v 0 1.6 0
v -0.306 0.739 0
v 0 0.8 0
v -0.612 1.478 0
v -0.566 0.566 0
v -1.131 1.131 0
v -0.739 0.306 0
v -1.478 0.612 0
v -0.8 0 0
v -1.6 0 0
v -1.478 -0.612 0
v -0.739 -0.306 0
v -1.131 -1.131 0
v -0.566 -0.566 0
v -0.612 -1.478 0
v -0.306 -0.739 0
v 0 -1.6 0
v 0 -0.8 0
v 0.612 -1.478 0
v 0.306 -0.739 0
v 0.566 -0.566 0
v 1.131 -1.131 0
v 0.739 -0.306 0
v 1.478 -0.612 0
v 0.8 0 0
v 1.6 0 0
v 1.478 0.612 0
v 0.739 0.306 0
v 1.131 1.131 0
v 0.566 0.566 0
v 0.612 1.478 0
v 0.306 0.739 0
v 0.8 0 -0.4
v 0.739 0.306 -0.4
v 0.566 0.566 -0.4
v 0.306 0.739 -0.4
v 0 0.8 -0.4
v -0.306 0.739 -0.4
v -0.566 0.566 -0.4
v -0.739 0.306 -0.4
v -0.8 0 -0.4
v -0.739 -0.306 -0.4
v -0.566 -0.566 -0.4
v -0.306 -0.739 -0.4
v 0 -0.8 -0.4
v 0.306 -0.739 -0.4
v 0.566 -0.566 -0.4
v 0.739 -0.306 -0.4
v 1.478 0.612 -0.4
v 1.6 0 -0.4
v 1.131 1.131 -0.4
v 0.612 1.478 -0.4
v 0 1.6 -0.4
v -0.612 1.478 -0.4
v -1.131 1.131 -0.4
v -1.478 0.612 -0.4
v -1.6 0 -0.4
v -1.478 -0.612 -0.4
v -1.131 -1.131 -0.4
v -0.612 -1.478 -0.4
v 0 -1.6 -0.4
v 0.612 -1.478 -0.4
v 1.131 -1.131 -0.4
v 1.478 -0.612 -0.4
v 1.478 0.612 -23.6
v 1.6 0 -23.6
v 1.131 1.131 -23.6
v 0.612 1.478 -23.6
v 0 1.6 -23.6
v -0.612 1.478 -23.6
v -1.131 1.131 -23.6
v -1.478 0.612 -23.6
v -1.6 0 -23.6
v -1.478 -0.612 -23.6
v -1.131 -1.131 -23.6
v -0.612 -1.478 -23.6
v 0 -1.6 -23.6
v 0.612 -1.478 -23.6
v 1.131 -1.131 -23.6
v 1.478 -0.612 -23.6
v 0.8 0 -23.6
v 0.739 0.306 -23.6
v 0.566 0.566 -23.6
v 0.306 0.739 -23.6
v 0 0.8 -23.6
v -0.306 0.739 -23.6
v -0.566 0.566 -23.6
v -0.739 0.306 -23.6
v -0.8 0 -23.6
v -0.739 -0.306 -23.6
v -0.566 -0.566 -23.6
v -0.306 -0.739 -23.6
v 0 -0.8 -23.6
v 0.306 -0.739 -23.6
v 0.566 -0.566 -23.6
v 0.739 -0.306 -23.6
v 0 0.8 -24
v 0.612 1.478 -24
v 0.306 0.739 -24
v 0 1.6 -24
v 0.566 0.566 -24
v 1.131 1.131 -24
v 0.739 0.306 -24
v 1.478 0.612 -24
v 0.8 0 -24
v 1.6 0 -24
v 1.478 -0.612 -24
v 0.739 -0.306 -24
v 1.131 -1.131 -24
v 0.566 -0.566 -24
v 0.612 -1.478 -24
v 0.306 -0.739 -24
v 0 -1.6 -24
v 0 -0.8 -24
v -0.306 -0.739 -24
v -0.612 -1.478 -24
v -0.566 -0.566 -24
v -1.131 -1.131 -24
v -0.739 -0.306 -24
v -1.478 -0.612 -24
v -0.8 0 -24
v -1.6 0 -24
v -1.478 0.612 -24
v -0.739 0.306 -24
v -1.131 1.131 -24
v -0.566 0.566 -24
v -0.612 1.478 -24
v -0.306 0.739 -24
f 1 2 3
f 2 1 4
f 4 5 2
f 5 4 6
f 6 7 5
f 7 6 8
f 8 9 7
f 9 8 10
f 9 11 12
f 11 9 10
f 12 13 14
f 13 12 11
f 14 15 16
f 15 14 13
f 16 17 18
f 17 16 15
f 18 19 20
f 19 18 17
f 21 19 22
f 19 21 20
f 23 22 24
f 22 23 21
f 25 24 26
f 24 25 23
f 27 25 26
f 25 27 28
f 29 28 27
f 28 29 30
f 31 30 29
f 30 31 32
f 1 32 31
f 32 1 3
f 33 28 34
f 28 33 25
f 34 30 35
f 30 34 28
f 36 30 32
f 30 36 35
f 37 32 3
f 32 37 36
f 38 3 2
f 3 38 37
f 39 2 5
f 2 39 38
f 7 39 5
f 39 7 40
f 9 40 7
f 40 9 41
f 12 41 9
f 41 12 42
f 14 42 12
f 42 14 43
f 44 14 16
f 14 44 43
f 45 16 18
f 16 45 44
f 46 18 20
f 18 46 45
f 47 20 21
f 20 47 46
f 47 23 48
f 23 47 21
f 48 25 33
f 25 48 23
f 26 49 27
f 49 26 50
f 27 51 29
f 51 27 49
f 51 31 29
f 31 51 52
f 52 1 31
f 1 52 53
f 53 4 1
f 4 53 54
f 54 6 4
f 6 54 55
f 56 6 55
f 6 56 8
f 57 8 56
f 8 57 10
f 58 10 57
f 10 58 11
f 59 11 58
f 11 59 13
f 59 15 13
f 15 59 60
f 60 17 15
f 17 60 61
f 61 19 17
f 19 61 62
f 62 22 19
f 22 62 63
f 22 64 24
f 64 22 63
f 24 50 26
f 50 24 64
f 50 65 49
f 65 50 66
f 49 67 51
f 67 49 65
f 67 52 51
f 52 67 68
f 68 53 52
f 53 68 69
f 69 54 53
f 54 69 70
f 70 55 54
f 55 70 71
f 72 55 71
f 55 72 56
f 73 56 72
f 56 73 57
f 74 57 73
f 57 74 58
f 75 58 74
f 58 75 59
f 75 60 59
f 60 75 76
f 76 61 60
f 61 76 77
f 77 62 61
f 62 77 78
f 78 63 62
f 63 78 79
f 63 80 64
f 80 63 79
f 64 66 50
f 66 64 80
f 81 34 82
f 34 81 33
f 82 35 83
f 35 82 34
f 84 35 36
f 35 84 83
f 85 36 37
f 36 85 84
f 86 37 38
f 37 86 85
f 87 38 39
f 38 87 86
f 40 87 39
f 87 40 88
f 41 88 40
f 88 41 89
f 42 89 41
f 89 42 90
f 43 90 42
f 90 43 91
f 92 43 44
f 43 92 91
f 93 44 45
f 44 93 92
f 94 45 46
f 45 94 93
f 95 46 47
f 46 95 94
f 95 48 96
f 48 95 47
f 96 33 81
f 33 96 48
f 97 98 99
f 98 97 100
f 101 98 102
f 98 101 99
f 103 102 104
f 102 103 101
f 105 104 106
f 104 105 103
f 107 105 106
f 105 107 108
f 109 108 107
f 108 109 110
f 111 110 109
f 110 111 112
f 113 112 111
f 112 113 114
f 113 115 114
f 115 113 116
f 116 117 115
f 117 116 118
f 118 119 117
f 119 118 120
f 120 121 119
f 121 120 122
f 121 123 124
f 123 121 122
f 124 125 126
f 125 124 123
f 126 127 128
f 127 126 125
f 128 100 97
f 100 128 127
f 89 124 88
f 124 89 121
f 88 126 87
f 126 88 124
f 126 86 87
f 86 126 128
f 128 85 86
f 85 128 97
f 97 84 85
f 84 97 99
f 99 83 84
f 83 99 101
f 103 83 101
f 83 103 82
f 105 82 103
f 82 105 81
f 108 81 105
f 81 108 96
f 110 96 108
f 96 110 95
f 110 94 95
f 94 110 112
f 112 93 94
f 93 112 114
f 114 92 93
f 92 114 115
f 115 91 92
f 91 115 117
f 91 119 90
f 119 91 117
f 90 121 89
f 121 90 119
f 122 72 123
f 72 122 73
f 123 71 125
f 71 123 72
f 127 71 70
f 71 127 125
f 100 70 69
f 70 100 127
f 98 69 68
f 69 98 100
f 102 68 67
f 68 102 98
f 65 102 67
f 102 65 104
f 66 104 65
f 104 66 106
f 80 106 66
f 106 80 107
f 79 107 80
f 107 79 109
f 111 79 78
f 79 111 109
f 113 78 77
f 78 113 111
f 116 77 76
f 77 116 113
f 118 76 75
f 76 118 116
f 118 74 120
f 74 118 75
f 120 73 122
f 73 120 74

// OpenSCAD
// file: ../p/4-4ring1.scad
use <../lib.scad>
function ldraw_lib__4_4ring1() = [
// 0 Ring  1 x 1.0
// 0 Name: 4-4ring1.dat
// 0 Author: James Jessiman
// 0 !LDRAW_ORG Primitive UPDATE 2009-01
// 0 !LICENSE Licensed under CC BY 2.0 and CC BY 4.0 : see CAreadme.txt
// 
// 0 BFC CERTIFY CCW
  [0,"BFC","CERTIFY"],
  [0,"BFC","CCW"],
// 
// 0 !HISTORY 1998-12-15 [PTadmin] Official Update 1998-10
// 0 !HISTORY 2002-04-08 [BrickCaster] Modified for BFC compliance
// 0 !HISTORY 2002-04-25 [PTadmin] Official Update 2002-02
// 0 !HISTORY 2007-06-24 [PTadmin] Header formatted for Contributor Agreement
// 0 !HISTORY 2008-07-01 [PTadmin] Official Update 2008-01
// 0 !HISTORY 2008-08-26 [cwdee] Switch polygon winding and rename
// 0 !HISTORY 2009-05-02 [PTadmin] Official Update 2009-01
// 
// 
// 4 16 -0.7654 0 1.8478 -0.3827 0 0.9239 0 0 1 0 0 2
  [4,16,-0.7654,0,1.8478,-0.3827,0,0.9239,0,0,1,0,0,2],
// 4 16 -1.4142 0 1.4142 -0.7071 0 0.7071 -0.3827 0 0.9239 -0.7654 0 1.8478
  [4,16,-1.4142,0,1.4142,-0.7071,0,0.7071,-0.3827,0,0.9239,-0.7654,0,1.8478],
// 4 16 -1.8478 0 0.7654 -0.9239 0 0.3827 -0.7071 0 0.7071 -1.4142 0 1.41420
  [4,16,-1.8478,0,0.7654,-0.9239,0,0.3827,-0.7071,0,0.7071,-1.4142,0,1.41420],
// 4 16 -2 0 0 -1 0 0 -0.9239 0 0.3827 -1.8478 0 0.7654
  [4,16,-2,0,0,-1,0,0,-0.9239,0,0.3827,-1.8478,0,0.7654],
// 4 16 -1.8478 0 -0.7654 -0.9239 0 -0.3827 -1 0 0 -2 0 0
  [4,16,-1.8478,0,-0.7654,-0.9239,0,-0.3827,-1,0,0,-2,0,0],
// 4 16 -1.4142 0 -1.4142 -0.7071 0 -0.7071 -0.9239 0 -0.3827 -1.8478 0 -0.7654
  [4,16,-1.4142,0,-1.4142,-0.7071,0,-0.7071,-0.9239,0,-0.3827,-1.8478,0,-0.7654],
// 4 16 -0.7654 0 -1.8478 -0.3827 0 -0.9239 -0.7071 0 -0.7071 -1.4142 0 -1.4142
  [4,16,-0.7654,0,-1.8478,-0.3827,0,-0.9239,-0.7071,0,-0.7071,-1.4142,0,-1.4142],
// 4 16 0 0 -2 0 0 -1 -0.3827 0 -0.9239 -0.7654 0 -1.8478
  [4,16,0,0,-2,0,0,-1,-0.3827,0,-0.9239,-0.7654,0,-1.8478],
// 4 16 0.7654 0 -1.8478 0.3827 0 -0.9239 0 0 -1 0 0 -2
  [4,16,0.7654,0,-1.8478,0.3827,0,-0.9239,0,0,-1,0,0,-2],
// 4 16 1.4142 0 -1.4142 0.7071 0 -0.7071 0.3827 0 -0.9239 0.7654 0 -1.8478
  [4,16,1.4142,0,-1.4142,0.7071,0,-0.7071,0.3827,0,-0.9239,0.7654,0,-1.8478],
// 4 16 1.8478 0 -0.7654 0.9239 0 -0.3827 0.7071 0 -0.7071 1.4142 0 -1.4142
  [4,16,1.8478,0,-0.7654,0.9239,0,-0.3827,0.7071,0,-0.7071,1.4142,0,-1.4142],
// 4 16 2 0 0 1 0 0 0.9239 0 -0.3827 1.8478 0 -0.7654
  [4,16,2,0,0,1,0,0,0.9239,0,-0.3827,1.8478,0,-0.7654],
// 4 16 1.8478 0 0.7654 0.9239 0 0.3827 1 0 0 2 0 0
  [4,16,1.8478,0,0.7654,0.9239,0,0.3827,1,0,0,2,0,0],
// 4 16 1.4142 0 1.4142 0.7071 0 0.7071 0.9239 0 0.3827 1.8478 0 0.7654
  [4,16,1.4142,0,1.4142,0.7071,0,0.7071,0.9239,0,0.3827,1.8478,0,0.7654],
// 4 16 0.7654 0 1.8478 0.3827 0 0.9239 0.7071 0 0.7071 1.4142 0 1.4142
  [4,16,0.7654,0,1.8478,0.3827,0,0.9239,0.7071,0,0.7071,1.4142,0,1.4142],
// 4 16 0 0 2 0 0 1 0.3827 0 0.9239 0.7654 0 1.8478
  [4,16,0,0,2,0,0,1,0.3827,0,0.9239,0.7654,0,1.8478],
// 0
];
module ldraw_lib__4_4ring1(step=0, col=false, unit=2/5, alt=false, line=0.2, solid=!$preview)
    makepoly(ldraw_lib__4_4ring1(), step=step, col=col, unit=unit, alt=alt, line=line, solid=solid);
ldraw_lib__4_4ring1(line=0.2);
// file: ../p/4-4edge.scad
use <../lib.scad>
function ldraw_lib__4_4edge() = [
// 0 Circle 1.0
// 0 Name: 4-4edge.dat
// 0 Author: James Jessiman
// 0 !LDRAW_ORG Primitive UPDATE 2017-01
// 0 !LICENSE Licensed under CC BY 2.0 and CC BY 4.0 : see CAreadme.txt
// 
// 0 BFC CERTIFY CCW
  [0,"BFC","CERTIFY"],
  [0,"BFC","CCW"],
// 
// 0 !HISTORY 1998-12-15 [PTadmin] Official Update 1998-10
// 0 !HISTORY 2005-12-28 [PTadmin] Official Update 2005-01
// 0 !HISTORY 2007-06-24 [PTadmin] Header formatted for Contributor Agreement
// 0 !HISTORY 2008-07-01 [PTadmin] Official Update 2008-01
// 0 !HISTORY 2017-01-15 [Steffen] BFCed
// 0 !HISTORY 2017-12-30 [PTadmin] Official Update 2017-01
// 
// 
// 2 24 1 0 0 0.9239 0 0.3827
  [2,24,1,0,0,0.9239,0,0.3827],
// 2 24 0.9239 0 0.3827 0.7071 0 0.7071
  [2,24,0.9239,0,0.3827,0.7071,0,0.7071],
// 2 24 0.7071 0 0.7071 0.3827 0 0.9239
  [2,24,0.7071,0,0.7071,0.3827,0,0.9239],
// 2 24 0.3827 0 0.9239 0 0 1
  [2,24,0.3827,0,0.9239,0,0,1],
// 2 24 0 0 1 -0.3827 0 0.9239
  [2,24,0,0,1,-0.3827,0,0.9239],
// 2 24 -0.3827 0 0.9239 -0.7071 0 0.7071
  [2,24,-0.3827,0,0.9239,-0.7071,0,0.7071],
// 2 24 -0.7071 0 0.7071 -0.9239 0 0.3827
  [2,24,-0.7071,0,0.7071,-0.9239,0,0.3827],
// 2 24 -0.9239 0 0.3827 -1 0 -0
  [2,24,-0.9239,0,0.3827,-1,0,-0],
// 2 24 -1 0 -0 -0.9239 0 -0.3827
  [2,24,-1,0,-0,-0.9239,0,-0.3827],
// 2 24 -0.9239 0 -0.3827 -0.7071 0 -0.7071
  [2,24,-0.9239,0,-0.3827,-0.7071,0,-0.7071],
// 2 24 -0.7071 0 -0.7071 -0.3827 0 -0.9239
  [2,24,-0.7071,0,-0.7071,-0.3827,0,-0.9239],
// 2 24 -0.3827 0 -0.9239 0 0 -1
  [2,24,-0.3827,0,-0.9239,0,0,-1],
// 2 24 0 0 -1 0.3827 0 -0.9239
  [2,24,0,0,-1,0.3827,0,-0.9239],
// 2 24 0.3827 0 -0.9239 0.7071 0 -0.7071
  [2,24,0.3827,0,-0.9239,0.7071,0,-0.7071],
// 2 24 0.7071 0 -0.7071 0.9239 0 -0.3827
  [2,24,0.7071,0,-0.7071,0.9239,0,-0.3827],
// 2 24 0.9239 0 -0.3827 1 0 0
  [2,24,0.9239,0,-0.3827,1,0,0],
];
module ldraw_lib__4_4edge(step=0, col=false, unit=2/5, alt=false, line=0.2, solid=!$preview)
    makepoly(ldraw_lib__4_4edge(), step=step, col=col, unit=unit, alt=alt, line=line, solid=solid);
ldraw_lib__4_4edge(line=0.2);
// file: ../p/4-4cyli.scad
use <../lib.scad>
function ldraw_lib__4_4cyli() = [
// 0 Cylinder 1.0
// 0 Name: 4-4cyli.dat
// 0 Author: James Jessiman
// 0 !LDRAW_ORG Primitive UPDATE 2005-01
// 0 !LICENSE Licensed under CC BY 2.0 and CC BY 4.0 : see CAreadme.txt
// 
// 0 BFC CERTIFY CCW
  [0,"BFC","CERTIFY"],
  [0,"BFC","CCW"],
// 
// 0 !HISTORY 1998-12-15 [PTadmin] Official Update 1998-10
// 0 !HISTORY 2002-03-23 [sbliss] Added BFC statement; merged headers from files in distributions LDraw 0.27 and Complete.
// 0 !HISTORY 2002-04-25 [PTadmin] Official Update 2002-02
// 0 !HISTORY 2004-12-14 [guyvivan] BFC CCW
// 0 !HISTORY 2005-12-28 [PTadmin] Official Update 2005-01
// 0 !HISTORY 2007-06-24 [PTadmin] Header formatted for Contributor Agreement
// 0 !HISTORY 2008-07-01 [PTadmin] Official Update 2008-01
// 
// 
// 4 16 1 1 0 0.9239 1 0.3827 0.9239 0 0.3827 1 0 0
  [4,16,1,1,0,0.9239,1,0.3827,0.9239,0,0.3827,1,0,0],
// 5 24 1 0 0 1 1 0 0.9239 0 0.3827 0.9239 0 -0.3827
  [5,24,1,0,0,1,1,0,0.9239,0,0.3827,0.9239,0,-0.3827],
// 4 16 0.9239 1 0.3827 0.7071 1 0.7071 0.7071 0 0.7071 0.9239 0 0.3827
  [4,16,0.9239,1,0.3827,0.7071,1,0.7071,0.7071,0,0.7071,0.9239,0,0.3827],
// 5 24 0.9239 0 0.3827 0.9239 1 0.3827 0.7071 0 0.7071 1 0 0
  [5,24,0.9239,0,0.3827,0.9239,1,0.3827,0.7071,0,0.7071,1,0,0],
// 4 16 0.7071 1 0.7071 0.3827 1 0.9239 0.3827 0 0.9239 0.7071 0 0.7071
  [4,16,0.7071,1,0.7071,0.3827,1,0.9239,0.3827,0,0.9239,0.7071,0,0.7071],
// 5 24 0.7071 0 0.7071 0.7071 1 0.7071 0.3827 0 0.9239 0.9239 0 0.3827
  [5,24,0.7071,0,0.7071,0.7071,1,0.7071,0.3827,0,0.9239,0.9239,0,0.3827],
// 4 16 0.3827 1 0.9239 0 1 1 0 0 1 0.3827 0 0.9239
  [4,16,0.3827,1,0.9239,0,1,1,0,0,1,0.3827,0,0.9239],
// 5 24 0.3827 0 0.9239 0.3827 1 0.9239 0 0 1 0.7071 0 0.7071
  [5,24,0.3827,0,0.9239,0.3827,1,0.9239,0,0,1,0.7071,0,0.7071],
// 4 16 0 1 1 -0.3827 1 0.9239 -0.3827 0 0.9239 0 0 1
  [4,16,0,1,1,-0.3827,1,0.9239,-0.3827,0,0.9239,0,0,1],
// 5 24 0 0 1 0 1 1 -0.3827 0 0.9239 0.3827 0 0.9239
  [5,24,0,0,1,0,1,1,-0.3827,0,0.9239,0.3827,0,0.9239],
// 4 16 -0.3827 1 0.9239 -0.7071 1 0.7071 -0.7071 0 0.7071 -0.3827 0 0.9239
  [4,16,-0.3827,1,0.9239,-0.7071,1,0.7071,-0.7071,0,0.7071,-0.3827,0,0.9239],
// 5 24 -0.3827 0 0.9239 -0.3827 1 0.9239 -0.7071 0 0.7071 0 0 1
  [5,24,-0.3827,0,0.9239,-0.3827,1,0.9239,-0.7071,0,0.7071,0,0,1],
// 4 16 -0.7071 1 0.7071 -0.9239 1 0.3827 -0.9239 0 0.3827 -0.7071 0 0.7071
  [4,16,-0.7071,1,0.7071,-0.9239,1,0.3827,-0.9239,0,0.3827,-0.7071,0,0.7071],
// 5 24 -0.7071 0 0.7071 -0.7071 1 0.7071 -0.9239 0 0.3827 -0.3827 0 0.9239
  [5,24,-0.7071,0,0.7071,-0.7071,1,0.7071,-0.9239,0,0.3827,-0.3827,0,0.9239],
// 4 16 -0.9239 1 0.3827 -1 1 0 -1 0 0 -0.9239 0 0.3827
  [4,16,-0.9239,1,0.3827,-1,1,0,-1,0,0,-0.9239,0,0.3827],
// 5 24 -0.9239 0 0.3827 -0.9239 1 0.3827 -1 0 0 -0.7071 0 0.7071
  [5,24,-0.9239,0,0.3827,-0.9239,1,0.3827,-1,0,0,-0.7071,0,0.7071],
// 4 16 -1 1 0 -0.9239 1 -0.3827 -0.9239 0 -0.3827 -1 0 0
  [4,16,-1,1,0,-0.9239,1,-0.3827,-0.9239,0,-0.3827,-1,0,0],
// 5 24 -1 0 0 -1 1 0 -0.9239 0 -0.3827 -0.9239 0 0.3827
  [5,24,-1,0,0,-1,1,0,-0.9239,0,-0.3827,-0.9239,0,0.3827],
// 4 16 -0.9239 1 -0.3827 -0.7071 1 -0.7071 -0.7071 0 -0.7071 -0.9239 0 -0.3827
  [4,16,-0.9239,1,-0.3827,-0.7071,1,-0.7071,-0.7071,0,-0.7071,-0.9239,0,-0.3827],
// 5 24 -0.9239 0 -0.3827 -0.9239 1 -0.3827 -0.7071 0 -0.7071 -1 0 0
  [5,24,-0.9239,0,-0.3827,-0.9239,1,-0.3827,-0.7071,0,-0.7071,-1,0,0],
// 4 16 -0.7071 1 -0.7071 -0.3827 1 -0.9239 -0.3827 0 -0.9239 -0.7071 0 -0.7071
  [4,16,-0.7071,1,-0.7071,-0.3827,1,-0.9239,-0.3827,0,-0.9239,-0.7071,0,-0.7071],
// 5 24 -0.7071 0 -0.7071 -0.7071 1 -0.7071 -0.3827 0 -0.9239 -0.9239 0 -0.3827
  [5,24,-0.7071,0,-0.7071,-0.7071,1,-0.7071,-0.3827,0,-0.9239,-0.9239,0,-0.3827],
// 4 16 -0.3827 1 -0.9239 0 1 -1 0 0 -1 -0.3827 0 -0.9239
  [4,16,-0.3827,1,-0.9239,0,1,-1,0,0,-1,-0.3827,0,-0.9239],
// 5 24 -0.3827 0 -0.9239 -0.3827 1 -0.9239 0 0 -1 -0.7071 0 -0.7071
  [5,24,-0.3827,0,-0.9239,-0.3827,1,-0.9239,0,0,-1,-0.7071,0,-0.7071],
// 4 16 0 1 -1 0.3827 1 -0.9239 0.3827 0 -0.9239 0 0 -1
  [4,16,0,1,-1,0.3827,1,-0.9239,0.3827,0,-0.9239,0,0,-1],
// 5 24 0 0 -1 0 1 -1 0.3827 0 -0.9239 -0.3827 0 -0.9239
  [5,24,0,0,-1,0,1,-1,0.3827,0,-0.9239,-0.3827,0,-0.9239],
// 4 16 0.3827 1 -0.9239 0.7071 1 -0.7071 0.7071 0 -0.7071 0.3827 0 -0.9239
  [4,16,0.3827,1,-0.9239,0.7071,1,-0.7071,0.7071,0,-0.7071,0.3827,0,-0.9239],
// 5 24 0.3827 0 -0.9239 0.3827 1 -0.9239 0.7071 0 -0.7071 0 0 -1
  [5,24,0.3827,0,-0.9239,0.3827,1,-0.9239,0.7071,0,-0.7071,0,0,-1],
// 4 16 0.7071 1 -0.7071 0.9239 1 -0.3827 0.9239 0 -0.3827 0.7071 0 -0.7071
  [4,16,0.7071,1,-0.7071,0.9239,1,-0.3827,0.9239,0,-0.3827,0.7071,0,-0.7071],
// 5 24 0.7071 0 -0.7071 0.7071 1 -0.7071 0.9239 0 -0.3827 0.3827 0 -0.9239
  [5,24,0.7071,0,-0.7071,0.7071,1,-0.7071,0.9239,0,-0.3827,0.3827,0,-0.9239],
// 4 16 0.9239 1 -0.3827 1 1 0 1 0 0 0.9239 0 -0.3827
  [4,16,0.9239,1,-0.3827,1,1,0,1,0,0,0.9239,0,-0.3827],
// 5 24 0.9239 0 -0.3827 0.9239 1 -0.3827 1 0 0 0.7071 0 -0.7071
  [5,24,0.9239,0,-0.3827,0.9239,1,-0.3827,1,0,0,0.7071,0,-0.7071],
// 0
];
module ldraw_lib__4_4cyli(step=0, col=false, unit=2/5, alt=false, line=0.2, solid=!$preview)
    makepoly(ldraw_lib__4_4cyli(), step=step, col=col, unit=unit, alt=alt, line=line, solid=solid);
ldraw_lib__4_4cyli(line=0.2);
// file: u9053.scad
use <../lib.scad>
use <../p/4-4cyli.scad>
use <../p/4-4edge.scad>
use <../p/4-4ring1.scad>
function ldraw_lib__u9053() = [
// 0 ~Technic Flex-System Hose End
// 0 Name: u9053.dat
// 0 Author: William Howard [WilliamH]
// 0 !LDRAW_ORG Part UPDATE 2011-02
// 0 !LICENSE Licensed under CC BY 2.0 and CC BY 4.0 : see CAreadme.txt
// 
// 0 BFC CERTIFY CCW
  [0,"BFC","CERTIFY"],
  [0,"BFC","CCW"],
// 
// 0 !HISTORY 2011-12-21 [cwdee] Reworked subparting technique
// 0 !HISTORY 2011-12-23 [PTadmin] Renamed from 76
// 0 !HISTORY 2011-12-29 [PTadmin] Official Update 2011-02
// 
// 
// 1 16 0 0 0 2 0 0 0 1 0 0 0 2 4-4ring1.dat
  [1,16,0,0,0,2,0,0,0,1,0,0,0,2, ldraw_lib__4_4ring1()],
// 1 16 0 0 0 2 0 0 0 1 0 0 0 2 4-4edge.dat
  [1,16,0,0,0,2,0,0,0,1,0,0,0,2, ldraw_lib__4_4edge()],
// 0 BFC INVERTNEXT
  [0,"BFC","INVERTNEXT"],
// 1 16 0 0 0 2 0 0 0 1 0 0 0 2 4-4cyli.dat
  [1,16,0,0,0,2,0,0,0,1,0,0,0,2, ldraw_lib__4_4cyli()],
// 1 16 0 0 0 4 0 0 0 1 0 0 0 4 4-4edge.dat
  [1,16,0,0,0,4,0,0,0,1,0,0,0,4, ldraw_lib__4_4edge()],
// 1 16 0 0 0 4 0 0 0 1 0 0 0 4 4-4cyli.dat
  [1,16,0,0,0,4,0,0,0,1,0,0,0,4, ldraw_lib__4_4cyli()],
// 0
];
module ldraw_lib__u9053(step=0, col=false, unit=2/5, alt=false, line=0.2, solid=!$preview)
    makepoly(ldraw_lib__u9053(), step=step, col=col, unit=unit, alt=alt, line=line, solid=solid);
ldraw_lib__u9053(line=0.2);
// file: 77.scad
use <../lib.scad>
use <../p/4-4cyli.scad>
function ldraw_lib__77() = [
// 0 ~Technic Flex-System Hose Segment
// 0 Name: 77.dat
// 0 Author: William Howard [WilliamH]
// 0 !LDRAW_ORG Part UPDATE 2011-02
// 0 !LICENSE Licensed under CC BY 2.0 and CC BY 4.0 : see CAreadme.txt
// 
// 0 BFC CERTIFY CCW
  [0,"BFC","CERTIFY"],
  [0,"BFC","CCW"],
// 
// 0 !HISTORY 2011-12-21 [cwdee] Reworked subparting technique
// 0 !HISTORY 2011-12-29 [PTadmin] Official Update 2011-02
// 
// 
// 1 16 0 0 0 4 0 0 0 1 0 0 0 4 4-4cyli.dat
  [1,16,0,0,0,4,0,0,0,1,0,0,0,4, ldraw_lib__4_4cyli()],
// 0 BFC INVERTNEXT
  [0,"BFC","INVERTNEXT"],
// 1 16 0 0 0 2 0 0 0 1 0 0 0 2 4-4cyli.dat
  [1,16,0,0,0,2,0,0,0,1,0,0,0,2, ldraw_lib__4_4cyli()],
// 0
];
module ldraw_lib__77(step=0, col=false, unit=2/5, alt=false, line=0.2, solid=!$preview)
    makepoly(ldraw_lib__77(), step=step, col=col, unit=unit, alt=alt, line=line, solid=solid);
ldraw_lib__77(line=0.2);
// main file
use <../lib.scad>
use <77.scad>
use <u9053.scad>
function ldraw_lib__76263() = [
// 0 Technic Flex-System Hose  3L (60LDU)
// 0 Name: 76263.dat
// 0 Author: Tim Gould [timgould]
// 0 !LDRAW_ORG Part UPDATE 2011-02
// 0 !LICENSE Licensed under CC BY 2.0 and CC BY 4.0 : see CAreadme.txt
// 
// 0 BFC CERTIFY CCW
  [0,"BFC","CERTIFY"],
  [0,"BFC","CCW"],
// 
// 0 !KEYWORDS bar, tube
// 
// 0 !HISTORY 2011-12-29 [PTadmin] Official Update 2011-02
// 
// 
// 1 16 0 0 0 1 0 0 0 1 0 0 0 1 u9053.dat
  [1,16,0,0,0,1,0,0,0,1,0,0,0,1, ldraw_lib__u9053()],
// 1 16 0 1 0 1 0 0 0 58 0 0 0 1 77.dat
  [1,16,0,1,0,1,0,0,0,58,0,0,0,1, ldraw_lib__77()],
// 1 16 0 60 0 -1 0 0 0 -1 0 0 0 1 u9053.dat
  [1,16,0,60,0,-1,0,0,0,-1,0,0,0,1, ldraw_lib__u9053()],
];
module ldraw_lib__76263(step=0, col=false, unit=2/5, alt=false, line=0.2, solid=!$preview)
    makepoly(ldraw_lib__76263(), step=step, col=col, unit=unit, alt=alt, line=line, solid=solid);
ldraw_lib__76263(line=0.2);
